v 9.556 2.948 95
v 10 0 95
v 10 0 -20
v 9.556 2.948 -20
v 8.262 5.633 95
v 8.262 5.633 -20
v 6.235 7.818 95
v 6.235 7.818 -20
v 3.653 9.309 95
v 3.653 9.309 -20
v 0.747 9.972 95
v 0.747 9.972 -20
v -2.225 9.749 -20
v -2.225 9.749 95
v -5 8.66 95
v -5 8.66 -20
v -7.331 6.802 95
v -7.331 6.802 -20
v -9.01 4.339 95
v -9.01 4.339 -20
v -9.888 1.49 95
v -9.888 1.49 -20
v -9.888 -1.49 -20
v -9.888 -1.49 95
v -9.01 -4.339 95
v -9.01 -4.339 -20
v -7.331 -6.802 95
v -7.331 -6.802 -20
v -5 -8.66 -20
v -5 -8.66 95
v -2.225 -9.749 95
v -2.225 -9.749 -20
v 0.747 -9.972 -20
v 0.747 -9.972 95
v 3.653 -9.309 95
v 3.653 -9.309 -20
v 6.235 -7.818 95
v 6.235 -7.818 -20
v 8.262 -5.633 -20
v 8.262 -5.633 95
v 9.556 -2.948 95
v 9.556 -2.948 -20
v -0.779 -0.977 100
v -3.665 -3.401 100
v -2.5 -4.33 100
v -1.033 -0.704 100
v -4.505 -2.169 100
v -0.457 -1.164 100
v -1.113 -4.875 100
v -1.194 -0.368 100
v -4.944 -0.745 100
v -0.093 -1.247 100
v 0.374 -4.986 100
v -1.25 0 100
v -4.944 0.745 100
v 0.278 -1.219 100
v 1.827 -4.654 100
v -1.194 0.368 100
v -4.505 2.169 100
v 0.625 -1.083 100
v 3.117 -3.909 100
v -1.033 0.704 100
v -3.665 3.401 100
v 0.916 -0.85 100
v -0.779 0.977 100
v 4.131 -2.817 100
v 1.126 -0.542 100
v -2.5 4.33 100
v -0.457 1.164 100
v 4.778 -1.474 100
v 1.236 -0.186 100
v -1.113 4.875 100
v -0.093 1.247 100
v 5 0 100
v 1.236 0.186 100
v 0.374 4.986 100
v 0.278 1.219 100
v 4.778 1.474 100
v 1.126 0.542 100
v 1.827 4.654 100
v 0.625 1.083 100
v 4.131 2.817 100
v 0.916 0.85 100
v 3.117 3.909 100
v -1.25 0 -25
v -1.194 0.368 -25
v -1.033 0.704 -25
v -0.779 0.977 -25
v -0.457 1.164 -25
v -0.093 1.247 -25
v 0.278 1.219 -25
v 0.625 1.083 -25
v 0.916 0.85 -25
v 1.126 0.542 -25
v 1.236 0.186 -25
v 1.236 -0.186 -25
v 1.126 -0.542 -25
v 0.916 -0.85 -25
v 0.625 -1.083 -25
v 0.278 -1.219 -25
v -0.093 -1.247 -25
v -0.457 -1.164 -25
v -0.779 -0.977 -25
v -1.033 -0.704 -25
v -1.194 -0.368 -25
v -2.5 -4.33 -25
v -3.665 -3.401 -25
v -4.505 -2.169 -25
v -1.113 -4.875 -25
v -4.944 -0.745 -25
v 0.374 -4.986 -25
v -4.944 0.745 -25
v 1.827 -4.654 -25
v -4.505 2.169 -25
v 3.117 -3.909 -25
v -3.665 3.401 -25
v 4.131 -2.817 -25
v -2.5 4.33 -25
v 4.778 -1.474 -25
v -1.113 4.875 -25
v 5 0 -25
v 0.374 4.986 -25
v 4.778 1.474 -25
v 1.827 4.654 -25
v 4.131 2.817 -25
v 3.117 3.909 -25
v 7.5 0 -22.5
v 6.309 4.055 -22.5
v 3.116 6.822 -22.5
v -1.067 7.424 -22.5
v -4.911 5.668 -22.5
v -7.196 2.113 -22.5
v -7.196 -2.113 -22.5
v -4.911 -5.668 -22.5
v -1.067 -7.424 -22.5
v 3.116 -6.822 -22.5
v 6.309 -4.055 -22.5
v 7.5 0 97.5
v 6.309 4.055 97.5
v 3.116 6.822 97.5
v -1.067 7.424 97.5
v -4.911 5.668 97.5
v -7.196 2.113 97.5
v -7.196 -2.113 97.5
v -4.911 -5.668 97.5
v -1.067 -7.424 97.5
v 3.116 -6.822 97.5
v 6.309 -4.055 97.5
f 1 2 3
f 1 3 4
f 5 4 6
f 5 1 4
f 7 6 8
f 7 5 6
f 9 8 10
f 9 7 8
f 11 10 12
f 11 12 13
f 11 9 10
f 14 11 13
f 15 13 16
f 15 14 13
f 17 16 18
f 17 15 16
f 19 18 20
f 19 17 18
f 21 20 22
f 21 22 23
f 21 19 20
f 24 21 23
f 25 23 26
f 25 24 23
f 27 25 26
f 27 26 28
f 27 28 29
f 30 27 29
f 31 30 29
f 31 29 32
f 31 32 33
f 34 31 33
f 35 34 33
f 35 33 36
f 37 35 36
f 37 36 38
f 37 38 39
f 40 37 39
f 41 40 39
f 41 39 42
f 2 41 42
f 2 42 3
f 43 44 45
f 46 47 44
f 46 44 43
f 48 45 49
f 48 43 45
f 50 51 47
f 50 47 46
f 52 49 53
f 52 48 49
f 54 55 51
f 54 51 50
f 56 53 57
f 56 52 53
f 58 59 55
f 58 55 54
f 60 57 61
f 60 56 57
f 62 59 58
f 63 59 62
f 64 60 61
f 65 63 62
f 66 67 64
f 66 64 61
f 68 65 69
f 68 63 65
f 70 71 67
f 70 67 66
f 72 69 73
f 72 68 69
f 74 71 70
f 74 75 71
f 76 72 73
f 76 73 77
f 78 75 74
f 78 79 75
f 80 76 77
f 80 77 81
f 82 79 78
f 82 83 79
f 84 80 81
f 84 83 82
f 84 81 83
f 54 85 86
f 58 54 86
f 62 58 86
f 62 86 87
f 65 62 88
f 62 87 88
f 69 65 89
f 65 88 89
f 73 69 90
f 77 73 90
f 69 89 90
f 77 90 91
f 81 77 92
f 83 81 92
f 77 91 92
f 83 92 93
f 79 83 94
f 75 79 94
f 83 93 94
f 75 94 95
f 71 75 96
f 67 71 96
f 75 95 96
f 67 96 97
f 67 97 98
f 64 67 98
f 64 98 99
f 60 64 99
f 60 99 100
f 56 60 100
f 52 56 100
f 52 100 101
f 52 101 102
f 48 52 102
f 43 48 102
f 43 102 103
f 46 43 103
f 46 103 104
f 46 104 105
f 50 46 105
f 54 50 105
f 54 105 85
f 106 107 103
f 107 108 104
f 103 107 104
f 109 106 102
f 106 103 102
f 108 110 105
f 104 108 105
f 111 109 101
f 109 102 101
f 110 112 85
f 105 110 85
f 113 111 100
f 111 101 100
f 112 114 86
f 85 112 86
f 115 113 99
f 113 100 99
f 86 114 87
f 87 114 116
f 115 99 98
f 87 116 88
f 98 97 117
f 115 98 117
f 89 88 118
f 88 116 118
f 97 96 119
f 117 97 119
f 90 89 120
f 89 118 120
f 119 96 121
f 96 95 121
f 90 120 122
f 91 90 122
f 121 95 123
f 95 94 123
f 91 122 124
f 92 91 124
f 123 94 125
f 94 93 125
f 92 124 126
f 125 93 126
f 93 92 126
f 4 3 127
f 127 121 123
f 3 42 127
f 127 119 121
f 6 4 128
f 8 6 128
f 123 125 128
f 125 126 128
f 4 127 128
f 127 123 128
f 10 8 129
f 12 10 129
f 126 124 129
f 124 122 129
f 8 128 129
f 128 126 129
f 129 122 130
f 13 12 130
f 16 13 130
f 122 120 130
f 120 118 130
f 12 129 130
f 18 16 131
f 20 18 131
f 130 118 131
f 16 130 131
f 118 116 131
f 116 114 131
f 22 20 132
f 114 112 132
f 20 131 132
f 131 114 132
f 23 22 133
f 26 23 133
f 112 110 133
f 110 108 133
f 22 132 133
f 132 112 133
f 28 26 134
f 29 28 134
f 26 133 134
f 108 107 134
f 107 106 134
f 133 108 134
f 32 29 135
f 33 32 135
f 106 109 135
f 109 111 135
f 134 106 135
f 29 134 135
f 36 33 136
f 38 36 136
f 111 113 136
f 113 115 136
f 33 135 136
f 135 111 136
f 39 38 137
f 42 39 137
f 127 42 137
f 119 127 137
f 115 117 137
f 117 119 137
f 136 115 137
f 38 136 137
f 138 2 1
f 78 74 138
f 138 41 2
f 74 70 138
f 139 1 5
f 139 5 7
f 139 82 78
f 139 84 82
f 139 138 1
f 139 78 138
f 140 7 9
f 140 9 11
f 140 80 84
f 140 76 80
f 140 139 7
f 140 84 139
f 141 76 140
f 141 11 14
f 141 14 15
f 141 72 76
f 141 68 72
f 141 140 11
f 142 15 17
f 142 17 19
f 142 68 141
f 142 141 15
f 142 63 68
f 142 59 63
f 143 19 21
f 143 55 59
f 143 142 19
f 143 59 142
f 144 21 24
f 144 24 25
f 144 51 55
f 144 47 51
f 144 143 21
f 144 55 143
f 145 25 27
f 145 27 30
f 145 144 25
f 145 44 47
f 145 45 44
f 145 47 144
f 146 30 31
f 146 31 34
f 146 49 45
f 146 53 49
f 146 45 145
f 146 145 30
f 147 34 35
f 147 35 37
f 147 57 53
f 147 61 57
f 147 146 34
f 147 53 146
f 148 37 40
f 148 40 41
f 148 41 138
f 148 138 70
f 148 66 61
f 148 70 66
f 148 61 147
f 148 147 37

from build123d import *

# Parameters (mm, degrees)
F0_R          = 10
F1_DEPTH      = 100
F1_DEPTH_BACK = 25
F2_SIZE       = 5
F4_D          = 2.5
F5_SIZE       = 5


with BuildPart() as f1:
    # F0 (on Top) → F1 (new body, two sides)
    with BuildSketch(Plane.XY) as f1_sk:
        Circle(F0_R)
    extrude(amount=F1_DEPTH)
    extrude(f1_sk.sketch, amount=-F1_DEPTH_BACK)

    # F2
    f2_edges = [f1.edges().sort_by_distance(p)[0] for p in [
        (-10, 0, 100),
    ]]
    chamfer(f2_edges, length=F2_SIZE)

    # F4 (through all)
    with Locations(Plane.XY.offset(100)):
        with Locations((0, 0)):
            Hole(F4_D / 2)

    # F5
    f5_edges = [f1.edges().sort_by_distance(p)[0] for p in [
        (-10, 0, -25),
    ]]
    chamfer(f5_edges, length=F5_SIZE)


solid = f1.part
